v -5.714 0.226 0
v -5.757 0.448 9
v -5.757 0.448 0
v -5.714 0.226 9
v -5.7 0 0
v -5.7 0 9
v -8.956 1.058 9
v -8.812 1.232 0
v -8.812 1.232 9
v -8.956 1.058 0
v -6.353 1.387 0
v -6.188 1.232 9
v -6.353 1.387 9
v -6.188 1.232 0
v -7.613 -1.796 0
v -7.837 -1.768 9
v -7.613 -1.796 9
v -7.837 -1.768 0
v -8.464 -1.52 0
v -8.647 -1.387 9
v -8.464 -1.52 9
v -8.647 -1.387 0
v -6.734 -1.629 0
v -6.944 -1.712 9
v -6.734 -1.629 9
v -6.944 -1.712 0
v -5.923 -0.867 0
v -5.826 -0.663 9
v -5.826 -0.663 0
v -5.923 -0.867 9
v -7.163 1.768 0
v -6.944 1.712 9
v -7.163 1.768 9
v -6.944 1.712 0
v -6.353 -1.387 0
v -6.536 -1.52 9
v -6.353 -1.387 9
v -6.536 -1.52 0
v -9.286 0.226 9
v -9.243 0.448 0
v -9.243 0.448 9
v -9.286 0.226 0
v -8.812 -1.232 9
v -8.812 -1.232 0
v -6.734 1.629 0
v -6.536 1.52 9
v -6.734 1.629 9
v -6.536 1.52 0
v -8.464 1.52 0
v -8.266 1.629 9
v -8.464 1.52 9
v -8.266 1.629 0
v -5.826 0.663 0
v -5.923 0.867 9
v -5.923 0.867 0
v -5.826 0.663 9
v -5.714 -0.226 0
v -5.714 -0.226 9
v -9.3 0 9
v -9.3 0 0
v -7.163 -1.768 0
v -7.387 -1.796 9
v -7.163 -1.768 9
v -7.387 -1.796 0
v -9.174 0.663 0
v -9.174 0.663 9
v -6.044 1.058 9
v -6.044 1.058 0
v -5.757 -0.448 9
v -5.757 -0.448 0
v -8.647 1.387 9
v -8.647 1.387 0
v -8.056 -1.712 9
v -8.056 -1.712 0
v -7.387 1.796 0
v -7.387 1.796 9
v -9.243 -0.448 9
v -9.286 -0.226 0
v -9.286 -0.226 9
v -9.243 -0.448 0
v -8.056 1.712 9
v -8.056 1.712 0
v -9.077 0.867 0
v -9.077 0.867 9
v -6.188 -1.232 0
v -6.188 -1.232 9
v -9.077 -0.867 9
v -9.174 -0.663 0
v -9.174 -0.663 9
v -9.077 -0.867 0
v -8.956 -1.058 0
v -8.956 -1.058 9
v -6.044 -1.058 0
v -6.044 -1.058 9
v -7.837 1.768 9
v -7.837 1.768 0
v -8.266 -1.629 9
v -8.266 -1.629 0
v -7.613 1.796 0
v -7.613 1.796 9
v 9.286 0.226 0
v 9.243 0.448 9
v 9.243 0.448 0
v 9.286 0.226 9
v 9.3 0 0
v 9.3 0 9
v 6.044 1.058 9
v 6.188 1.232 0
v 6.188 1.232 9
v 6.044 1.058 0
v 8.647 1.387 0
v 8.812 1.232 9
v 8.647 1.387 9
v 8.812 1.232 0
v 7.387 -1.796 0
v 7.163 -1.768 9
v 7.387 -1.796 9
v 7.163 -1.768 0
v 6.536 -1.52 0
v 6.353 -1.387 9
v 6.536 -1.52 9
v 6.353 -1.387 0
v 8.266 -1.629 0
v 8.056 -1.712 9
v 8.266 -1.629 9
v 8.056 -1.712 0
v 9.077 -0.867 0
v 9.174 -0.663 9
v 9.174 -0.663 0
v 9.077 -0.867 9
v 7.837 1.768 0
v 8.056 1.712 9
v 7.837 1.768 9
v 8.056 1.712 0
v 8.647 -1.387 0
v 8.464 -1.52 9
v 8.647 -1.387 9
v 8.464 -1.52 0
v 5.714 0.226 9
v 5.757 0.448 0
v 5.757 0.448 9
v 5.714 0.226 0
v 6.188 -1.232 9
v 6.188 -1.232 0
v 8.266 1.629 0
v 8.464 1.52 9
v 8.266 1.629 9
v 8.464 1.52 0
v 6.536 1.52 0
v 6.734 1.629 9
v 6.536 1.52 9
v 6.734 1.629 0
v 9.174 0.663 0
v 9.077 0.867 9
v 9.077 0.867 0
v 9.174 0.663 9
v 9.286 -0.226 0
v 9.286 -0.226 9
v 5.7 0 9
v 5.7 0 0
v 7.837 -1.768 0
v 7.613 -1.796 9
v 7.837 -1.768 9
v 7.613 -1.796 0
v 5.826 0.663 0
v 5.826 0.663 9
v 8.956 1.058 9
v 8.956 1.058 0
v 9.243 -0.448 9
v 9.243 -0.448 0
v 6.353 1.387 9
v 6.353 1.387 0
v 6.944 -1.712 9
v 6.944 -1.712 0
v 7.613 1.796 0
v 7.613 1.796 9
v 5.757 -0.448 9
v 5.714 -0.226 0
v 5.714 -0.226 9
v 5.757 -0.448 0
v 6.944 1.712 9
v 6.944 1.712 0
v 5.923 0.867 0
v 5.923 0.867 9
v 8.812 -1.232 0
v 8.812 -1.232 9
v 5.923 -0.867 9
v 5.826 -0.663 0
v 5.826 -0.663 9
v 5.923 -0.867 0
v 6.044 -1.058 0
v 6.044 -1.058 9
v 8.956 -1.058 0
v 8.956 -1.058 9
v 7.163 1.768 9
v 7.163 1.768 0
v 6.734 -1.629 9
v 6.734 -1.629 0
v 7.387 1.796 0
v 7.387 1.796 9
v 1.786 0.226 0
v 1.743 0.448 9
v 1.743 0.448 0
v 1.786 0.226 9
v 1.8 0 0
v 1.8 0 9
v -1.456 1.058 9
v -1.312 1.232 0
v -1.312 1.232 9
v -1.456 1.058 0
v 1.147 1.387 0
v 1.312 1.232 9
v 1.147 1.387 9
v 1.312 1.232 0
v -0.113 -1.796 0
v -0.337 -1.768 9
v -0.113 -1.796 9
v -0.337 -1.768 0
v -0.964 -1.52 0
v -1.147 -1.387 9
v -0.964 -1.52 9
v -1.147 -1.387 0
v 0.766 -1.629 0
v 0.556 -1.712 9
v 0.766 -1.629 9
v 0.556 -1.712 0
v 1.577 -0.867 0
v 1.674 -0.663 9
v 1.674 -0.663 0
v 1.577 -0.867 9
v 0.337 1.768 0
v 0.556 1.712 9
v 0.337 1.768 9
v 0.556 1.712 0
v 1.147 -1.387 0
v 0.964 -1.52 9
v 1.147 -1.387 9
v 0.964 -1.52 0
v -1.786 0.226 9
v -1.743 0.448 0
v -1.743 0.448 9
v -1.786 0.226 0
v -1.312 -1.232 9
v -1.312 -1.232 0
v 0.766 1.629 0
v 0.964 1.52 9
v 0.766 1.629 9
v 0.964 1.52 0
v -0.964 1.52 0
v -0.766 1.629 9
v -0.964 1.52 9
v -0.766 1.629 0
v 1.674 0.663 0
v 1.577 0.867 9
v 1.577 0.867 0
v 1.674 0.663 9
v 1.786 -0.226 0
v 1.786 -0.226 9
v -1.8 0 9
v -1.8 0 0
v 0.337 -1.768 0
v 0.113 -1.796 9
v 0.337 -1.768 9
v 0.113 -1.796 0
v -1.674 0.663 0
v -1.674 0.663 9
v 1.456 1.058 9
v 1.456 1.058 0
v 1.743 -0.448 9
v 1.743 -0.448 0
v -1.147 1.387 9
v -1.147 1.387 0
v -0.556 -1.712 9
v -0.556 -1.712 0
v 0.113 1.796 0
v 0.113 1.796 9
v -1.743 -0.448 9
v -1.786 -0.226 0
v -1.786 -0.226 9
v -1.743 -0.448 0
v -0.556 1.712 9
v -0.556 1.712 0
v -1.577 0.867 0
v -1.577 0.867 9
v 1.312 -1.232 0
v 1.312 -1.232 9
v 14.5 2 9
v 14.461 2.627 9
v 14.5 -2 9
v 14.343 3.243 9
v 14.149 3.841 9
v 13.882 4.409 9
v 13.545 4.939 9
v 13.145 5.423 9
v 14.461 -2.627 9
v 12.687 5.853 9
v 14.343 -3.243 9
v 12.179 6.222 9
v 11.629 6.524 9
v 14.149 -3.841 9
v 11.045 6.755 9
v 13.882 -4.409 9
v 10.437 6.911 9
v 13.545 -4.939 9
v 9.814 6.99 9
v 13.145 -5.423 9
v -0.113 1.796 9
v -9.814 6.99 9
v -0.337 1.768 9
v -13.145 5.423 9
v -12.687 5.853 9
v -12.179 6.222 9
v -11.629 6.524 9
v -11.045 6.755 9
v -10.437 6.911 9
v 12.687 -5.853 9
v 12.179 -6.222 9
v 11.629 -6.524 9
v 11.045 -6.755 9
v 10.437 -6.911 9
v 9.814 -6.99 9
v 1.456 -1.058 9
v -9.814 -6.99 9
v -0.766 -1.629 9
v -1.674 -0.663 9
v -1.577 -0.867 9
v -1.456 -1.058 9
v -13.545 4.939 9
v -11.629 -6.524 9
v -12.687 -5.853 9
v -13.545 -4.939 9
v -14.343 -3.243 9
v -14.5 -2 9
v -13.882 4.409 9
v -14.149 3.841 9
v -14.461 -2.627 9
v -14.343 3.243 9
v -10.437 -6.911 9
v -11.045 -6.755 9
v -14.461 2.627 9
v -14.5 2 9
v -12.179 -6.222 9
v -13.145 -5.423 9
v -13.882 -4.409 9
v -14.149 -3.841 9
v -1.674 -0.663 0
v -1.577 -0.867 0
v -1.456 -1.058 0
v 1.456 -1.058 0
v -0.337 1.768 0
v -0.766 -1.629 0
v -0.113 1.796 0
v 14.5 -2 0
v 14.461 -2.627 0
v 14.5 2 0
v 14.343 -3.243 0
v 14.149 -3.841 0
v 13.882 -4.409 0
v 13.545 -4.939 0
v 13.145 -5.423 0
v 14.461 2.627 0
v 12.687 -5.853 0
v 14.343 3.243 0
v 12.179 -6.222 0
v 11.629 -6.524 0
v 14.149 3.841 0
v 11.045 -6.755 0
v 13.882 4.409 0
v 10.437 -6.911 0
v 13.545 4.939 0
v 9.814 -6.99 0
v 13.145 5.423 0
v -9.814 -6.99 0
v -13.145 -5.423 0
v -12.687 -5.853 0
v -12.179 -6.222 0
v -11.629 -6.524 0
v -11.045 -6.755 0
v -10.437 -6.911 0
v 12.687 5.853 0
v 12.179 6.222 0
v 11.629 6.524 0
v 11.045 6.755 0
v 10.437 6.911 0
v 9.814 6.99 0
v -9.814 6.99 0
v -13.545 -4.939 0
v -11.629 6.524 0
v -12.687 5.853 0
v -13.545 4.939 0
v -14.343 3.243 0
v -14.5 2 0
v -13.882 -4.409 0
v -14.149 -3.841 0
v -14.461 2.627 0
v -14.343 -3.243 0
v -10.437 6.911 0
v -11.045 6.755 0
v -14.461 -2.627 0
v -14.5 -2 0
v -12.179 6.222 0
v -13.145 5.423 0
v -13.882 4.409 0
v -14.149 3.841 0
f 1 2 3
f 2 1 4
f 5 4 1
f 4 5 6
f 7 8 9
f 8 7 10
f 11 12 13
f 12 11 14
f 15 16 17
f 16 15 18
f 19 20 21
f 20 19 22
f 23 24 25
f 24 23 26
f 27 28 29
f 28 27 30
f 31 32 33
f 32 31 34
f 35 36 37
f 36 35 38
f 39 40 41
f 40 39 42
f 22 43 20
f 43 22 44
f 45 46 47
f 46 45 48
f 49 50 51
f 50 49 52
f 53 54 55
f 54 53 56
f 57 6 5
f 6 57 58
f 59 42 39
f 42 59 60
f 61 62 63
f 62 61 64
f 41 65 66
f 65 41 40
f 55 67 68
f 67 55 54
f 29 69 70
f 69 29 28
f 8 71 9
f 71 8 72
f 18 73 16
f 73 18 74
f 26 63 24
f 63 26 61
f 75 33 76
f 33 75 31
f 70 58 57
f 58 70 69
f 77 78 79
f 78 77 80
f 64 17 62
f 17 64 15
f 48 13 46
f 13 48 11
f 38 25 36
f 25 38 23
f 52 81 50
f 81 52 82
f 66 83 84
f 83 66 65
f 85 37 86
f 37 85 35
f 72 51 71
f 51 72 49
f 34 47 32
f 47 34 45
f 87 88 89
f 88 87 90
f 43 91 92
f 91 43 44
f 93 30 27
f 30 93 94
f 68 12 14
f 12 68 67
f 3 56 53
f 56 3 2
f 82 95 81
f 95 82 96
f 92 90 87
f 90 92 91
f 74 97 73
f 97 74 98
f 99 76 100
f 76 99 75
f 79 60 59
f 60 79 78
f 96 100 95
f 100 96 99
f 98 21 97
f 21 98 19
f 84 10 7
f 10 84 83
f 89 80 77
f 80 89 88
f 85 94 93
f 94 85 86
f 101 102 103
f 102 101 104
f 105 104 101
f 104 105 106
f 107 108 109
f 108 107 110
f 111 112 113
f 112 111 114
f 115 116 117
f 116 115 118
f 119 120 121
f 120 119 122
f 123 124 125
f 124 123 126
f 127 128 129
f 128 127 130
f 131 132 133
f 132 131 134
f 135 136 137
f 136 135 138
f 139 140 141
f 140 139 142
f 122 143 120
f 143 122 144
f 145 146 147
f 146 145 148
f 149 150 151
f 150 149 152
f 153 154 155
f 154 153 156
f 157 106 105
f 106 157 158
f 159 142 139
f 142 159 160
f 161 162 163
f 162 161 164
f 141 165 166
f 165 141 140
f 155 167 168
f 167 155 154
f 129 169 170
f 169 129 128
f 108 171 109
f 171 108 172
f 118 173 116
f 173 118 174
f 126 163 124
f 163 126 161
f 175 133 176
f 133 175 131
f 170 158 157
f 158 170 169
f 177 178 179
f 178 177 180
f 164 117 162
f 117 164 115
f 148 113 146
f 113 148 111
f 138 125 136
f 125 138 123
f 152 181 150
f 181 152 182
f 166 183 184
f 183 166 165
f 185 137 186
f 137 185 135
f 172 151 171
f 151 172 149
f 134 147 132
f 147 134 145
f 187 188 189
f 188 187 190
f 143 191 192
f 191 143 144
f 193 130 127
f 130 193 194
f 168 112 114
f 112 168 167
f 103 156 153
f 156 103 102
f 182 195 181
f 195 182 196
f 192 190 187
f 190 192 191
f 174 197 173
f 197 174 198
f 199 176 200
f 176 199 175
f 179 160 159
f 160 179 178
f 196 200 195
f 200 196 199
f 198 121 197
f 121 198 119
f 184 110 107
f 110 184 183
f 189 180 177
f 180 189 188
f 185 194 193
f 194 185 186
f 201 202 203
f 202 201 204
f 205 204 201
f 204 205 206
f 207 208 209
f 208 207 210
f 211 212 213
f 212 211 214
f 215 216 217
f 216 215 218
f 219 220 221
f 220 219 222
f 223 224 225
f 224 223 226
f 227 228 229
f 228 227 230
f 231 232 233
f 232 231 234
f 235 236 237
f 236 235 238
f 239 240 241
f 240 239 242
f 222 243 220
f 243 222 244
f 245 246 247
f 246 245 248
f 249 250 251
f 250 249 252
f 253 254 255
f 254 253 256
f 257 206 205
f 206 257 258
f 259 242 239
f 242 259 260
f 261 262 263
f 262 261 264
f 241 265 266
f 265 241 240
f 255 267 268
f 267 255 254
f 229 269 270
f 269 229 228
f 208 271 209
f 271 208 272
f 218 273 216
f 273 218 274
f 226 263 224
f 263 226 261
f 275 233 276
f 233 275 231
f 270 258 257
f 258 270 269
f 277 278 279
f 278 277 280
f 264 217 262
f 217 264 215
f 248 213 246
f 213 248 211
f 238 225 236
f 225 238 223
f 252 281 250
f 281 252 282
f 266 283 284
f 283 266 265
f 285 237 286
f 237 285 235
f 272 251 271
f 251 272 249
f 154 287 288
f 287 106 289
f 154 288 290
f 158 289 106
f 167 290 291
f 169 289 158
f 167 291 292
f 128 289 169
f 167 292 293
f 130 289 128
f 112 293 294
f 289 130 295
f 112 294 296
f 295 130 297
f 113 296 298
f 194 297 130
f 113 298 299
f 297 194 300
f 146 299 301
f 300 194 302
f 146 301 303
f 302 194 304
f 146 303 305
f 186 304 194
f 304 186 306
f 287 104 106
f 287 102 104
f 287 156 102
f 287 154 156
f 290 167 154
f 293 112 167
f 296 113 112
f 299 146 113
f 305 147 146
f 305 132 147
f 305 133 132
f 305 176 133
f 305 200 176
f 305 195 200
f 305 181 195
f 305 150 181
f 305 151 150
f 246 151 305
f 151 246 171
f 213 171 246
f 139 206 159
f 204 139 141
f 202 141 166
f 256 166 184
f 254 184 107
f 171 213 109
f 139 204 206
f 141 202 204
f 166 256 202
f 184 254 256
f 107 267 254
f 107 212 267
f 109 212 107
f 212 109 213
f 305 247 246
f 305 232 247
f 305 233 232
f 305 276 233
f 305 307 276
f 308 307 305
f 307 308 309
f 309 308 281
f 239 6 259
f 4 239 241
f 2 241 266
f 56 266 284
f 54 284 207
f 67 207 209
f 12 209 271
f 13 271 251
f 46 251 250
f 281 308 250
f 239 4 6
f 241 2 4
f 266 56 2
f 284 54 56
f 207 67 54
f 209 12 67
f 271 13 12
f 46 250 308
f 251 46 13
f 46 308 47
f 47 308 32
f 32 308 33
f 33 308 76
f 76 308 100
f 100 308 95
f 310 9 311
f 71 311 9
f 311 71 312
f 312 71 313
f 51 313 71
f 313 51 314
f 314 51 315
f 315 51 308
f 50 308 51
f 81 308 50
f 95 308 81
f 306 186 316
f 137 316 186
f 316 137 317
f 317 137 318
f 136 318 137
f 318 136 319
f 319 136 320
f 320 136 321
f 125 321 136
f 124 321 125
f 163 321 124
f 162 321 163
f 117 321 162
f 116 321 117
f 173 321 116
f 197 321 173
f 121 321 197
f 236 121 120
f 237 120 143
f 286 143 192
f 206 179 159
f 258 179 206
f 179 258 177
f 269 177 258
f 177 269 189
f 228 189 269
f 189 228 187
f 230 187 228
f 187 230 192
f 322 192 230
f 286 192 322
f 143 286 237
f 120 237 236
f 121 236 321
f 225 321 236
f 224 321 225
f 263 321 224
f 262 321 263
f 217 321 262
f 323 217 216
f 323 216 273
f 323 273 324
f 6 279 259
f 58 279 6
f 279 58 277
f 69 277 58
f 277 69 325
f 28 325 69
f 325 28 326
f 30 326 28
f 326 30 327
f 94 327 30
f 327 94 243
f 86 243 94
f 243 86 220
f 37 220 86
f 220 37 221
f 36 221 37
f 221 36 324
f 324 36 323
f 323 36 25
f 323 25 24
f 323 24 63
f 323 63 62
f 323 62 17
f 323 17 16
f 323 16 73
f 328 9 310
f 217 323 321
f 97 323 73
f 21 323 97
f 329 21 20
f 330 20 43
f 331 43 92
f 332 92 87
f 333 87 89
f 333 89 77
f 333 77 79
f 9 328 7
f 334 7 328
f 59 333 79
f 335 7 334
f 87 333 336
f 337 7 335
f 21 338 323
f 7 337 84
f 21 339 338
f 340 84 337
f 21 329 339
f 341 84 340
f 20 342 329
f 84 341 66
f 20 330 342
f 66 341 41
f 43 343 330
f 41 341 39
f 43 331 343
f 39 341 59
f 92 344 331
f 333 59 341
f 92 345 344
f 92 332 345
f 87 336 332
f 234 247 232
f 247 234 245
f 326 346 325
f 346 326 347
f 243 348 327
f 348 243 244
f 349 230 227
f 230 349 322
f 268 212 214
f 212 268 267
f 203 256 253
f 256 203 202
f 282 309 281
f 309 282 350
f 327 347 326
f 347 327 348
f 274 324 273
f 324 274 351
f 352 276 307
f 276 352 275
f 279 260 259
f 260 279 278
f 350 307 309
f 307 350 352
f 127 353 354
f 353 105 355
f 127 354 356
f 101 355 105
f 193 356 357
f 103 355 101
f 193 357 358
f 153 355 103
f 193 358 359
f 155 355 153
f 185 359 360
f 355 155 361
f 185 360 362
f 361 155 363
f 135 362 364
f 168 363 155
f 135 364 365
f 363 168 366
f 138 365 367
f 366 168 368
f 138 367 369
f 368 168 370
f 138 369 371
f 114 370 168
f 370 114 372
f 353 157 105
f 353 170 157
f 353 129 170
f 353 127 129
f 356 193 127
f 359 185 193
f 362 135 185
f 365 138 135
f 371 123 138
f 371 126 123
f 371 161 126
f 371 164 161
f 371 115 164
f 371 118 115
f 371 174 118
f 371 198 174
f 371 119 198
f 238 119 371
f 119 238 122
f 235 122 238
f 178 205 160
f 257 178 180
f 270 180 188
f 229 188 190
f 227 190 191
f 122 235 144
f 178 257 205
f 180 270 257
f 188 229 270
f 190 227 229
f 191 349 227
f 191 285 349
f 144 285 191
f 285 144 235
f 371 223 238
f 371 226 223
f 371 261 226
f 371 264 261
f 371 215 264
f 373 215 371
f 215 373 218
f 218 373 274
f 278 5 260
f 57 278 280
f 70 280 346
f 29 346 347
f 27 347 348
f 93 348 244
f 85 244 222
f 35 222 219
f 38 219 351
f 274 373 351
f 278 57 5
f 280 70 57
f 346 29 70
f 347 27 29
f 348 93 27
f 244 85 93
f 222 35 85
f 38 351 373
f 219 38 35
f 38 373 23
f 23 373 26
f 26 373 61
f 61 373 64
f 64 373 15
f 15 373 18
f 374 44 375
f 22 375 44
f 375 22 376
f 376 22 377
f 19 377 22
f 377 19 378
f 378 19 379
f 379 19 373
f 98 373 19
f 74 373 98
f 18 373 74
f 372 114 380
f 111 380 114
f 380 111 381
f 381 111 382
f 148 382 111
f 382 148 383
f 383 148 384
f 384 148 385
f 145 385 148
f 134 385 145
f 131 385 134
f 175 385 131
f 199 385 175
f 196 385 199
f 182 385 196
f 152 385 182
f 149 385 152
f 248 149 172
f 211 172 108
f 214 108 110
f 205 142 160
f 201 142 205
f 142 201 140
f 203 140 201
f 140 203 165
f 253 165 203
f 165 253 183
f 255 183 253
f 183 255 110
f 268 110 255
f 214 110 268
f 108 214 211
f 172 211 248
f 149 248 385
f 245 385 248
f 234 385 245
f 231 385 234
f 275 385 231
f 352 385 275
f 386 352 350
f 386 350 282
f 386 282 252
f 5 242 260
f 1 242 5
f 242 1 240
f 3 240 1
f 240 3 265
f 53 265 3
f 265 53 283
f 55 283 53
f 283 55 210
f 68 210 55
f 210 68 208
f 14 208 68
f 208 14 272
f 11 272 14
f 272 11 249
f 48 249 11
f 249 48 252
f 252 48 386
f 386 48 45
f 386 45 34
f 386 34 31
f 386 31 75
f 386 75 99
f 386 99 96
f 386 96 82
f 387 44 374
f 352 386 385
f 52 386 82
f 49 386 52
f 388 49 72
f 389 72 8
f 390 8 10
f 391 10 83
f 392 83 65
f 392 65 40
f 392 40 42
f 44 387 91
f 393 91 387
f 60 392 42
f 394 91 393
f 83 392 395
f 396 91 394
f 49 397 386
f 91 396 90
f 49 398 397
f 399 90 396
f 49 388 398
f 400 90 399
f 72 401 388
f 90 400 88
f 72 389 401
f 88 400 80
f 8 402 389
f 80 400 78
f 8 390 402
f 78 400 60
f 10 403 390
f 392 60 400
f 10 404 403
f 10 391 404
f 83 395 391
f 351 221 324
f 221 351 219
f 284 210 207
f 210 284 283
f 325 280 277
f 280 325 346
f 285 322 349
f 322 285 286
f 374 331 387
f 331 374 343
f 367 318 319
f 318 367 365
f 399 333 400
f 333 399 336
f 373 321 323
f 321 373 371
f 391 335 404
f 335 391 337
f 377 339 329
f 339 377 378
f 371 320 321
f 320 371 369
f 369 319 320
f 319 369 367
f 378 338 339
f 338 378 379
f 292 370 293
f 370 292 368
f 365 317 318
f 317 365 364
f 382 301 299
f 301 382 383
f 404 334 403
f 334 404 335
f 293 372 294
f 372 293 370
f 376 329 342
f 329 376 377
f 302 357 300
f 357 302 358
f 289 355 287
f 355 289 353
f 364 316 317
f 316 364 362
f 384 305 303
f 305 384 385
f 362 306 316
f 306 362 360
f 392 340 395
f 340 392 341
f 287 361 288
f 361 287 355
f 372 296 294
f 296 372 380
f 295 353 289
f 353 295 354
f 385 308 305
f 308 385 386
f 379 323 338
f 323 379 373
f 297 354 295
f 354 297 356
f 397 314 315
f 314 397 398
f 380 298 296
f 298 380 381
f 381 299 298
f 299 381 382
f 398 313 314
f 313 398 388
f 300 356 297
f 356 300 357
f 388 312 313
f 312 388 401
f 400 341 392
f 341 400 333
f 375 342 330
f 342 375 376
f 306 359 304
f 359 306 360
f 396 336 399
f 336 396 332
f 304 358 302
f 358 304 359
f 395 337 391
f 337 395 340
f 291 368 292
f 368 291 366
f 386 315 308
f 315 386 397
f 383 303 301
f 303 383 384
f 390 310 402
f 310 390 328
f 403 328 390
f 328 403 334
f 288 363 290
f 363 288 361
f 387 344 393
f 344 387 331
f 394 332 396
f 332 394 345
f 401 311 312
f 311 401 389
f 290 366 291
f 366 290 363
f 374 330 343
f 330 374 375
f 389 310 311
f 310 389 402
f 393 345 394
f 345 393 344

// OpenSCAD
$fn = 50;


difference() {
	union() {
		hull() {
			translate(v = [-9.5000000000, 2.0000000000, 0]) {
				cylinder(h = 9, r = 5);
			}
			translate(v = [9.5000000000, 2.0000000000, 0]) {
				cylinder(h = 9, r = 5);
			}
			translate(v = [-9.5000000000, -2.0000000000, 0]) {
				cylinder(h = 9, r = 5);
			}
			translate(v = [9.5000000000, -2.0000000000, 0]) {
				cylinder(h = 9, r = 5);
			}
		}
	}
	union() {
		translate(v = [-7.5000000000, 0.0000000000, -100.0000000000]) {
			cylinder(h = 200, r = 1.8000000000);
		}
		translate(v = [7.5000000000, 0.0000000000, -100.0000000000]) {
			cylinder(h = 200, r = 1.8000000000);
		}
		translate(v = [-7.5000000000, 0.0000000000, 0]) {
			cylinder(h = 9, r = 1.8000000000);
		}
		cylinder(h = 9, r = 1.8000000000);
		translate(v = [7.5000000000, 0.0000000000, 0]) {
			cylinder(h = 9, r = 1.8000000000);
		}
		translate(v = [-7.5000000000, 0.0000000000, 0]) {
			cylinder(h = 9, r = 1.8000000000);
		}
		cylinder(h = 9, r = 1.8000000000);
		translate(v = [7.5000000000, 0.0000000000, 0]) {
			cylinder(h = 9, r = 1.8000000000);
		}
		translate(v = [-7.5000000000, 0.0000000000, 0]) {
			cylinder(h = 9, r = 1.8000000000);
		}
		cylinder(h = 9, r = 1.8000000000);
		translate(v = [7.5000000000, 0.0000000000, 0]) {
			cylinder(h = 9, r = 1.8000000000);
		}
	}
}
